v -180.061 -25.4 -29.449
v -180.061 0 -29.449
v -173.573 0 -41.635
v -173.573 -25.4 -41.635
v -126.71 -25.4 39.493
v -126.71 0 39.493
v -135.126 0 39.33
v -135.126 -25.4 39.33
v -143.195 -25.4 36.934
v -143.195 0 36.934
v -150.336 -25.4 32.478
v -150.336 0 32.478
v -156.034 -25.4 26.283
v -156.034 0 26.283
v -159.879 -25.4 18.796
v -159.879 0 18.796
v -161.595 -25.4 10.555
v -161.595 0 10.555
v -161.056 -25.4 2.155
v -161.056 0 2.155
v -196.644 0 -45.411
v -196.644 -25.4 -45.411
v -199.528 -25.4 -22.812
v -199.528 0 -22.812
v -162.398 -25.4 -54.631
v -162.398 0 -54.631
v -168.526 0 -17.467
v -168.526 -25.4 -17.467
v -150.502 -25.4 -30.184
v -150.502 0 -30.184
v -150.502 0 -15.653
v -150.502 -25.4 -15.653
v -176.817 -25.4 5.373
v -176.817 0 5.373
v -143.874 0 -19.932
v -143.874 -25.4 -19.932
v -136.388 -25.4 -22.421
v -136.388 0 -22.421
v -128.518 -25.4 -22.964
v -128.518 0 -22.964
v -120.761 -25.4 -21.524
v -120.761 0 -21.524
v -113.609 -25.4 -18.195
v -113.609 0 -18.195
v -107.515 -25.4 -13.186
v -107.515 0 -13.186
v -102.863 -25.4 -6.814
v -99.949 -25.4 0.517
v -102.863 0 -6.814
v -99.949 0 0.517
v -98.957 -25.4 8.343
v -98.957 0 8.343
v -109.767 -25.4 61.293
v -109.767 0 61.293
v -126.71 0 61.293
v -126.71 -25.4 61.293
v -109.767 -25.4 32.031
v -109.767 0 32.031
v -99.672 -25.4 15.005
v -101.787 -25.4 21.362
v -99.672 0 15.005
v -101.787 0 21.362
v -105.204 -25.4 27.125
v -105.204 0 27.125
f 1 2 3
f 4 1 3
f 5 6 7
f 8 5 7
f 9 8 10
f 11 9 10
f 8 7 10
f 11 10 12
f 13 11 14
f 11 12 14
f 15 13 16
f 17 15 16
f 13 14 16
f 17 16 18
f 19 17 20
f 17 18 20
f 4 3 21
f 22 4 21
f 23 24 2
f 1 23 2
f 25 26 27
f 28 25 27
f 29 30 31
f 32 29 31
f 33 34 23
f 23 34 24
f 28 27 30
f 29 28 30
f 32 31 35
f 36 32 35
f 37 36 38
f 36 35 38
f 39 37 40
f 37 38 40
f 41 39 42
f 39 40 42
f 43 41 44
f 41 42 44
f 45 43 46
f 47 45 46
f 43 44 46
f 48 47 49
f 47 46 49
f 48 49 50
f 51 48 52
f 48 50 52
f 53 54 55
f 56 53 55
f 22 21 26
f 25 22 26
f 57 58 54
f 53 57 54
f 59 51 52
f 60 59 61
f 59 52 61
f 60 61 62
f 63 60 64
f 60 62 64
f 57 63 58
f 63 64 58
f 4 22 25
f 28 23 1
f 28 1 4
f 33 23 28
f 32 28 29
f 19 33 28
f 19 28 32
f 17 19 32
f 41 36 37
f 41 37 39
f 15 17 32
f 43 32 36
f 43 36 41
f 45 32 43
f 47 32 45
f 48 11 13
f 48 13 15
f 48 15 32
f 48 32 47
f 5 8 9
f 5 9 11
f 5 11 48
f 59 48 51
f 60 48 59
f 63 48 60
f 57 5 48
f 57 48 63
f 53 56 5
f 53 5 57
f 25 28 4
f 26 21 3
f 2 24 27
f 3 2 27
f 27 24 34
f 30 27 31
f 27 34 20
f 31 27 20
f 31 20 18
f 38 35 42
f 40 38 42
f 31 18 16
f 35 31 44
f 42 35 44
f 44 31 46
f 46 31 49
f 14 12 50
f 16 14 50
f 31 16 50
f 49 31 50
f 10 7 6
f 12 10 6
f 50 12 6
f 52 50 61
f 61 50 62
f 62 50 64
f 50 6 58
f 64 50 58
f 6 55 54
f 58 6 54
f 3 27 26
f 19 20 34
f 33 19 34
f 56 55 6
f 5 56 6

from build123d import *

# Parameters (mm, degrees)
F1_DEPTH = 25.4
F3_DEPTH = 25.4


with BuildPart() as f1:
    # F0 (on Front) → F1 (new body)
    with BuildSketch(Plane.XZ):
        Polygon((-199.5275318623, -22.8119939566), (-180.0614446402, -29.4490549713), (-173.5727488995, -41.6347756982), (-196.6436803341, -45.4109199345), (-162.3977720737, -54.6305887401), (-168.5259789228, -17.4674503505), (-150.5018025637, -30.1844198257), (-150.5018025637, 0), (-176.8171042204, 5.3729466163), align=None)
    extrude(amount=F1_DEPTH)

    # F2 (on Front) → F3 (join)
    with BuildSketch(Plane.XZ):
        with BuildLine():
            Line((-109.767191112, 61.2932294607), (-126.709908247, 61.2932294607))
            Line((-126.709908247, 61.2932294607), (-126.709908247, 39.4931892306))
            ThreePointArc((-126.709908247, 39.4931892306), (-117.6753186658, 37.0409814921), (-109.767191112, 32.031126176))
            Line((-109.767191112, 32.031126176), (-109.767191112, 61.2932294607))
        make_face()
        with BuildLine():
            ThreePointArc((-109.767191112, 32.031126176), (-117.6753186658, 37.0409814921), (-126.709908247, 39.4931892306))
            Line((-126.709908247, 39.4931892306), (-126.709908247, 24.0076240152))
            Line((-126.709908247, 24.0076240152), (-109.767191112, 24.0076240152))
            Line((-109.767191112, 24.0076240152), (-109.767191112, 32.031126176))
        make_face()
        with BuildLine():
            Line((-126.709908247, 24.0076240152), (-126.709908247, 39.4931892306))
            ThreePointArc((-126.709908247, 39.4931892306), (-141.5942846277, 37.6022015758), (-153.8963533146, 29.0126963179))
            ThreePointArc((-153.8963533146, 29.0126963179), (-141.3568088034, -21.0066330726), (-98.9566655593, 8.3430064842))
            ThreePointArc((-98.9566655593, 8.3430064842), (-101.7870306722, 21.3621700255), (-109.767191112, 32.031126176))
            Line((-109.767191112, 32.031126176), (-109.767191112, 24.0076240152))
            Line((-109.767191112, 24.0076240152), (-126.709908247, 24.0076240152))
        make_face()
    extrude(amount=F3_DEPTH)


solid = f1.part
